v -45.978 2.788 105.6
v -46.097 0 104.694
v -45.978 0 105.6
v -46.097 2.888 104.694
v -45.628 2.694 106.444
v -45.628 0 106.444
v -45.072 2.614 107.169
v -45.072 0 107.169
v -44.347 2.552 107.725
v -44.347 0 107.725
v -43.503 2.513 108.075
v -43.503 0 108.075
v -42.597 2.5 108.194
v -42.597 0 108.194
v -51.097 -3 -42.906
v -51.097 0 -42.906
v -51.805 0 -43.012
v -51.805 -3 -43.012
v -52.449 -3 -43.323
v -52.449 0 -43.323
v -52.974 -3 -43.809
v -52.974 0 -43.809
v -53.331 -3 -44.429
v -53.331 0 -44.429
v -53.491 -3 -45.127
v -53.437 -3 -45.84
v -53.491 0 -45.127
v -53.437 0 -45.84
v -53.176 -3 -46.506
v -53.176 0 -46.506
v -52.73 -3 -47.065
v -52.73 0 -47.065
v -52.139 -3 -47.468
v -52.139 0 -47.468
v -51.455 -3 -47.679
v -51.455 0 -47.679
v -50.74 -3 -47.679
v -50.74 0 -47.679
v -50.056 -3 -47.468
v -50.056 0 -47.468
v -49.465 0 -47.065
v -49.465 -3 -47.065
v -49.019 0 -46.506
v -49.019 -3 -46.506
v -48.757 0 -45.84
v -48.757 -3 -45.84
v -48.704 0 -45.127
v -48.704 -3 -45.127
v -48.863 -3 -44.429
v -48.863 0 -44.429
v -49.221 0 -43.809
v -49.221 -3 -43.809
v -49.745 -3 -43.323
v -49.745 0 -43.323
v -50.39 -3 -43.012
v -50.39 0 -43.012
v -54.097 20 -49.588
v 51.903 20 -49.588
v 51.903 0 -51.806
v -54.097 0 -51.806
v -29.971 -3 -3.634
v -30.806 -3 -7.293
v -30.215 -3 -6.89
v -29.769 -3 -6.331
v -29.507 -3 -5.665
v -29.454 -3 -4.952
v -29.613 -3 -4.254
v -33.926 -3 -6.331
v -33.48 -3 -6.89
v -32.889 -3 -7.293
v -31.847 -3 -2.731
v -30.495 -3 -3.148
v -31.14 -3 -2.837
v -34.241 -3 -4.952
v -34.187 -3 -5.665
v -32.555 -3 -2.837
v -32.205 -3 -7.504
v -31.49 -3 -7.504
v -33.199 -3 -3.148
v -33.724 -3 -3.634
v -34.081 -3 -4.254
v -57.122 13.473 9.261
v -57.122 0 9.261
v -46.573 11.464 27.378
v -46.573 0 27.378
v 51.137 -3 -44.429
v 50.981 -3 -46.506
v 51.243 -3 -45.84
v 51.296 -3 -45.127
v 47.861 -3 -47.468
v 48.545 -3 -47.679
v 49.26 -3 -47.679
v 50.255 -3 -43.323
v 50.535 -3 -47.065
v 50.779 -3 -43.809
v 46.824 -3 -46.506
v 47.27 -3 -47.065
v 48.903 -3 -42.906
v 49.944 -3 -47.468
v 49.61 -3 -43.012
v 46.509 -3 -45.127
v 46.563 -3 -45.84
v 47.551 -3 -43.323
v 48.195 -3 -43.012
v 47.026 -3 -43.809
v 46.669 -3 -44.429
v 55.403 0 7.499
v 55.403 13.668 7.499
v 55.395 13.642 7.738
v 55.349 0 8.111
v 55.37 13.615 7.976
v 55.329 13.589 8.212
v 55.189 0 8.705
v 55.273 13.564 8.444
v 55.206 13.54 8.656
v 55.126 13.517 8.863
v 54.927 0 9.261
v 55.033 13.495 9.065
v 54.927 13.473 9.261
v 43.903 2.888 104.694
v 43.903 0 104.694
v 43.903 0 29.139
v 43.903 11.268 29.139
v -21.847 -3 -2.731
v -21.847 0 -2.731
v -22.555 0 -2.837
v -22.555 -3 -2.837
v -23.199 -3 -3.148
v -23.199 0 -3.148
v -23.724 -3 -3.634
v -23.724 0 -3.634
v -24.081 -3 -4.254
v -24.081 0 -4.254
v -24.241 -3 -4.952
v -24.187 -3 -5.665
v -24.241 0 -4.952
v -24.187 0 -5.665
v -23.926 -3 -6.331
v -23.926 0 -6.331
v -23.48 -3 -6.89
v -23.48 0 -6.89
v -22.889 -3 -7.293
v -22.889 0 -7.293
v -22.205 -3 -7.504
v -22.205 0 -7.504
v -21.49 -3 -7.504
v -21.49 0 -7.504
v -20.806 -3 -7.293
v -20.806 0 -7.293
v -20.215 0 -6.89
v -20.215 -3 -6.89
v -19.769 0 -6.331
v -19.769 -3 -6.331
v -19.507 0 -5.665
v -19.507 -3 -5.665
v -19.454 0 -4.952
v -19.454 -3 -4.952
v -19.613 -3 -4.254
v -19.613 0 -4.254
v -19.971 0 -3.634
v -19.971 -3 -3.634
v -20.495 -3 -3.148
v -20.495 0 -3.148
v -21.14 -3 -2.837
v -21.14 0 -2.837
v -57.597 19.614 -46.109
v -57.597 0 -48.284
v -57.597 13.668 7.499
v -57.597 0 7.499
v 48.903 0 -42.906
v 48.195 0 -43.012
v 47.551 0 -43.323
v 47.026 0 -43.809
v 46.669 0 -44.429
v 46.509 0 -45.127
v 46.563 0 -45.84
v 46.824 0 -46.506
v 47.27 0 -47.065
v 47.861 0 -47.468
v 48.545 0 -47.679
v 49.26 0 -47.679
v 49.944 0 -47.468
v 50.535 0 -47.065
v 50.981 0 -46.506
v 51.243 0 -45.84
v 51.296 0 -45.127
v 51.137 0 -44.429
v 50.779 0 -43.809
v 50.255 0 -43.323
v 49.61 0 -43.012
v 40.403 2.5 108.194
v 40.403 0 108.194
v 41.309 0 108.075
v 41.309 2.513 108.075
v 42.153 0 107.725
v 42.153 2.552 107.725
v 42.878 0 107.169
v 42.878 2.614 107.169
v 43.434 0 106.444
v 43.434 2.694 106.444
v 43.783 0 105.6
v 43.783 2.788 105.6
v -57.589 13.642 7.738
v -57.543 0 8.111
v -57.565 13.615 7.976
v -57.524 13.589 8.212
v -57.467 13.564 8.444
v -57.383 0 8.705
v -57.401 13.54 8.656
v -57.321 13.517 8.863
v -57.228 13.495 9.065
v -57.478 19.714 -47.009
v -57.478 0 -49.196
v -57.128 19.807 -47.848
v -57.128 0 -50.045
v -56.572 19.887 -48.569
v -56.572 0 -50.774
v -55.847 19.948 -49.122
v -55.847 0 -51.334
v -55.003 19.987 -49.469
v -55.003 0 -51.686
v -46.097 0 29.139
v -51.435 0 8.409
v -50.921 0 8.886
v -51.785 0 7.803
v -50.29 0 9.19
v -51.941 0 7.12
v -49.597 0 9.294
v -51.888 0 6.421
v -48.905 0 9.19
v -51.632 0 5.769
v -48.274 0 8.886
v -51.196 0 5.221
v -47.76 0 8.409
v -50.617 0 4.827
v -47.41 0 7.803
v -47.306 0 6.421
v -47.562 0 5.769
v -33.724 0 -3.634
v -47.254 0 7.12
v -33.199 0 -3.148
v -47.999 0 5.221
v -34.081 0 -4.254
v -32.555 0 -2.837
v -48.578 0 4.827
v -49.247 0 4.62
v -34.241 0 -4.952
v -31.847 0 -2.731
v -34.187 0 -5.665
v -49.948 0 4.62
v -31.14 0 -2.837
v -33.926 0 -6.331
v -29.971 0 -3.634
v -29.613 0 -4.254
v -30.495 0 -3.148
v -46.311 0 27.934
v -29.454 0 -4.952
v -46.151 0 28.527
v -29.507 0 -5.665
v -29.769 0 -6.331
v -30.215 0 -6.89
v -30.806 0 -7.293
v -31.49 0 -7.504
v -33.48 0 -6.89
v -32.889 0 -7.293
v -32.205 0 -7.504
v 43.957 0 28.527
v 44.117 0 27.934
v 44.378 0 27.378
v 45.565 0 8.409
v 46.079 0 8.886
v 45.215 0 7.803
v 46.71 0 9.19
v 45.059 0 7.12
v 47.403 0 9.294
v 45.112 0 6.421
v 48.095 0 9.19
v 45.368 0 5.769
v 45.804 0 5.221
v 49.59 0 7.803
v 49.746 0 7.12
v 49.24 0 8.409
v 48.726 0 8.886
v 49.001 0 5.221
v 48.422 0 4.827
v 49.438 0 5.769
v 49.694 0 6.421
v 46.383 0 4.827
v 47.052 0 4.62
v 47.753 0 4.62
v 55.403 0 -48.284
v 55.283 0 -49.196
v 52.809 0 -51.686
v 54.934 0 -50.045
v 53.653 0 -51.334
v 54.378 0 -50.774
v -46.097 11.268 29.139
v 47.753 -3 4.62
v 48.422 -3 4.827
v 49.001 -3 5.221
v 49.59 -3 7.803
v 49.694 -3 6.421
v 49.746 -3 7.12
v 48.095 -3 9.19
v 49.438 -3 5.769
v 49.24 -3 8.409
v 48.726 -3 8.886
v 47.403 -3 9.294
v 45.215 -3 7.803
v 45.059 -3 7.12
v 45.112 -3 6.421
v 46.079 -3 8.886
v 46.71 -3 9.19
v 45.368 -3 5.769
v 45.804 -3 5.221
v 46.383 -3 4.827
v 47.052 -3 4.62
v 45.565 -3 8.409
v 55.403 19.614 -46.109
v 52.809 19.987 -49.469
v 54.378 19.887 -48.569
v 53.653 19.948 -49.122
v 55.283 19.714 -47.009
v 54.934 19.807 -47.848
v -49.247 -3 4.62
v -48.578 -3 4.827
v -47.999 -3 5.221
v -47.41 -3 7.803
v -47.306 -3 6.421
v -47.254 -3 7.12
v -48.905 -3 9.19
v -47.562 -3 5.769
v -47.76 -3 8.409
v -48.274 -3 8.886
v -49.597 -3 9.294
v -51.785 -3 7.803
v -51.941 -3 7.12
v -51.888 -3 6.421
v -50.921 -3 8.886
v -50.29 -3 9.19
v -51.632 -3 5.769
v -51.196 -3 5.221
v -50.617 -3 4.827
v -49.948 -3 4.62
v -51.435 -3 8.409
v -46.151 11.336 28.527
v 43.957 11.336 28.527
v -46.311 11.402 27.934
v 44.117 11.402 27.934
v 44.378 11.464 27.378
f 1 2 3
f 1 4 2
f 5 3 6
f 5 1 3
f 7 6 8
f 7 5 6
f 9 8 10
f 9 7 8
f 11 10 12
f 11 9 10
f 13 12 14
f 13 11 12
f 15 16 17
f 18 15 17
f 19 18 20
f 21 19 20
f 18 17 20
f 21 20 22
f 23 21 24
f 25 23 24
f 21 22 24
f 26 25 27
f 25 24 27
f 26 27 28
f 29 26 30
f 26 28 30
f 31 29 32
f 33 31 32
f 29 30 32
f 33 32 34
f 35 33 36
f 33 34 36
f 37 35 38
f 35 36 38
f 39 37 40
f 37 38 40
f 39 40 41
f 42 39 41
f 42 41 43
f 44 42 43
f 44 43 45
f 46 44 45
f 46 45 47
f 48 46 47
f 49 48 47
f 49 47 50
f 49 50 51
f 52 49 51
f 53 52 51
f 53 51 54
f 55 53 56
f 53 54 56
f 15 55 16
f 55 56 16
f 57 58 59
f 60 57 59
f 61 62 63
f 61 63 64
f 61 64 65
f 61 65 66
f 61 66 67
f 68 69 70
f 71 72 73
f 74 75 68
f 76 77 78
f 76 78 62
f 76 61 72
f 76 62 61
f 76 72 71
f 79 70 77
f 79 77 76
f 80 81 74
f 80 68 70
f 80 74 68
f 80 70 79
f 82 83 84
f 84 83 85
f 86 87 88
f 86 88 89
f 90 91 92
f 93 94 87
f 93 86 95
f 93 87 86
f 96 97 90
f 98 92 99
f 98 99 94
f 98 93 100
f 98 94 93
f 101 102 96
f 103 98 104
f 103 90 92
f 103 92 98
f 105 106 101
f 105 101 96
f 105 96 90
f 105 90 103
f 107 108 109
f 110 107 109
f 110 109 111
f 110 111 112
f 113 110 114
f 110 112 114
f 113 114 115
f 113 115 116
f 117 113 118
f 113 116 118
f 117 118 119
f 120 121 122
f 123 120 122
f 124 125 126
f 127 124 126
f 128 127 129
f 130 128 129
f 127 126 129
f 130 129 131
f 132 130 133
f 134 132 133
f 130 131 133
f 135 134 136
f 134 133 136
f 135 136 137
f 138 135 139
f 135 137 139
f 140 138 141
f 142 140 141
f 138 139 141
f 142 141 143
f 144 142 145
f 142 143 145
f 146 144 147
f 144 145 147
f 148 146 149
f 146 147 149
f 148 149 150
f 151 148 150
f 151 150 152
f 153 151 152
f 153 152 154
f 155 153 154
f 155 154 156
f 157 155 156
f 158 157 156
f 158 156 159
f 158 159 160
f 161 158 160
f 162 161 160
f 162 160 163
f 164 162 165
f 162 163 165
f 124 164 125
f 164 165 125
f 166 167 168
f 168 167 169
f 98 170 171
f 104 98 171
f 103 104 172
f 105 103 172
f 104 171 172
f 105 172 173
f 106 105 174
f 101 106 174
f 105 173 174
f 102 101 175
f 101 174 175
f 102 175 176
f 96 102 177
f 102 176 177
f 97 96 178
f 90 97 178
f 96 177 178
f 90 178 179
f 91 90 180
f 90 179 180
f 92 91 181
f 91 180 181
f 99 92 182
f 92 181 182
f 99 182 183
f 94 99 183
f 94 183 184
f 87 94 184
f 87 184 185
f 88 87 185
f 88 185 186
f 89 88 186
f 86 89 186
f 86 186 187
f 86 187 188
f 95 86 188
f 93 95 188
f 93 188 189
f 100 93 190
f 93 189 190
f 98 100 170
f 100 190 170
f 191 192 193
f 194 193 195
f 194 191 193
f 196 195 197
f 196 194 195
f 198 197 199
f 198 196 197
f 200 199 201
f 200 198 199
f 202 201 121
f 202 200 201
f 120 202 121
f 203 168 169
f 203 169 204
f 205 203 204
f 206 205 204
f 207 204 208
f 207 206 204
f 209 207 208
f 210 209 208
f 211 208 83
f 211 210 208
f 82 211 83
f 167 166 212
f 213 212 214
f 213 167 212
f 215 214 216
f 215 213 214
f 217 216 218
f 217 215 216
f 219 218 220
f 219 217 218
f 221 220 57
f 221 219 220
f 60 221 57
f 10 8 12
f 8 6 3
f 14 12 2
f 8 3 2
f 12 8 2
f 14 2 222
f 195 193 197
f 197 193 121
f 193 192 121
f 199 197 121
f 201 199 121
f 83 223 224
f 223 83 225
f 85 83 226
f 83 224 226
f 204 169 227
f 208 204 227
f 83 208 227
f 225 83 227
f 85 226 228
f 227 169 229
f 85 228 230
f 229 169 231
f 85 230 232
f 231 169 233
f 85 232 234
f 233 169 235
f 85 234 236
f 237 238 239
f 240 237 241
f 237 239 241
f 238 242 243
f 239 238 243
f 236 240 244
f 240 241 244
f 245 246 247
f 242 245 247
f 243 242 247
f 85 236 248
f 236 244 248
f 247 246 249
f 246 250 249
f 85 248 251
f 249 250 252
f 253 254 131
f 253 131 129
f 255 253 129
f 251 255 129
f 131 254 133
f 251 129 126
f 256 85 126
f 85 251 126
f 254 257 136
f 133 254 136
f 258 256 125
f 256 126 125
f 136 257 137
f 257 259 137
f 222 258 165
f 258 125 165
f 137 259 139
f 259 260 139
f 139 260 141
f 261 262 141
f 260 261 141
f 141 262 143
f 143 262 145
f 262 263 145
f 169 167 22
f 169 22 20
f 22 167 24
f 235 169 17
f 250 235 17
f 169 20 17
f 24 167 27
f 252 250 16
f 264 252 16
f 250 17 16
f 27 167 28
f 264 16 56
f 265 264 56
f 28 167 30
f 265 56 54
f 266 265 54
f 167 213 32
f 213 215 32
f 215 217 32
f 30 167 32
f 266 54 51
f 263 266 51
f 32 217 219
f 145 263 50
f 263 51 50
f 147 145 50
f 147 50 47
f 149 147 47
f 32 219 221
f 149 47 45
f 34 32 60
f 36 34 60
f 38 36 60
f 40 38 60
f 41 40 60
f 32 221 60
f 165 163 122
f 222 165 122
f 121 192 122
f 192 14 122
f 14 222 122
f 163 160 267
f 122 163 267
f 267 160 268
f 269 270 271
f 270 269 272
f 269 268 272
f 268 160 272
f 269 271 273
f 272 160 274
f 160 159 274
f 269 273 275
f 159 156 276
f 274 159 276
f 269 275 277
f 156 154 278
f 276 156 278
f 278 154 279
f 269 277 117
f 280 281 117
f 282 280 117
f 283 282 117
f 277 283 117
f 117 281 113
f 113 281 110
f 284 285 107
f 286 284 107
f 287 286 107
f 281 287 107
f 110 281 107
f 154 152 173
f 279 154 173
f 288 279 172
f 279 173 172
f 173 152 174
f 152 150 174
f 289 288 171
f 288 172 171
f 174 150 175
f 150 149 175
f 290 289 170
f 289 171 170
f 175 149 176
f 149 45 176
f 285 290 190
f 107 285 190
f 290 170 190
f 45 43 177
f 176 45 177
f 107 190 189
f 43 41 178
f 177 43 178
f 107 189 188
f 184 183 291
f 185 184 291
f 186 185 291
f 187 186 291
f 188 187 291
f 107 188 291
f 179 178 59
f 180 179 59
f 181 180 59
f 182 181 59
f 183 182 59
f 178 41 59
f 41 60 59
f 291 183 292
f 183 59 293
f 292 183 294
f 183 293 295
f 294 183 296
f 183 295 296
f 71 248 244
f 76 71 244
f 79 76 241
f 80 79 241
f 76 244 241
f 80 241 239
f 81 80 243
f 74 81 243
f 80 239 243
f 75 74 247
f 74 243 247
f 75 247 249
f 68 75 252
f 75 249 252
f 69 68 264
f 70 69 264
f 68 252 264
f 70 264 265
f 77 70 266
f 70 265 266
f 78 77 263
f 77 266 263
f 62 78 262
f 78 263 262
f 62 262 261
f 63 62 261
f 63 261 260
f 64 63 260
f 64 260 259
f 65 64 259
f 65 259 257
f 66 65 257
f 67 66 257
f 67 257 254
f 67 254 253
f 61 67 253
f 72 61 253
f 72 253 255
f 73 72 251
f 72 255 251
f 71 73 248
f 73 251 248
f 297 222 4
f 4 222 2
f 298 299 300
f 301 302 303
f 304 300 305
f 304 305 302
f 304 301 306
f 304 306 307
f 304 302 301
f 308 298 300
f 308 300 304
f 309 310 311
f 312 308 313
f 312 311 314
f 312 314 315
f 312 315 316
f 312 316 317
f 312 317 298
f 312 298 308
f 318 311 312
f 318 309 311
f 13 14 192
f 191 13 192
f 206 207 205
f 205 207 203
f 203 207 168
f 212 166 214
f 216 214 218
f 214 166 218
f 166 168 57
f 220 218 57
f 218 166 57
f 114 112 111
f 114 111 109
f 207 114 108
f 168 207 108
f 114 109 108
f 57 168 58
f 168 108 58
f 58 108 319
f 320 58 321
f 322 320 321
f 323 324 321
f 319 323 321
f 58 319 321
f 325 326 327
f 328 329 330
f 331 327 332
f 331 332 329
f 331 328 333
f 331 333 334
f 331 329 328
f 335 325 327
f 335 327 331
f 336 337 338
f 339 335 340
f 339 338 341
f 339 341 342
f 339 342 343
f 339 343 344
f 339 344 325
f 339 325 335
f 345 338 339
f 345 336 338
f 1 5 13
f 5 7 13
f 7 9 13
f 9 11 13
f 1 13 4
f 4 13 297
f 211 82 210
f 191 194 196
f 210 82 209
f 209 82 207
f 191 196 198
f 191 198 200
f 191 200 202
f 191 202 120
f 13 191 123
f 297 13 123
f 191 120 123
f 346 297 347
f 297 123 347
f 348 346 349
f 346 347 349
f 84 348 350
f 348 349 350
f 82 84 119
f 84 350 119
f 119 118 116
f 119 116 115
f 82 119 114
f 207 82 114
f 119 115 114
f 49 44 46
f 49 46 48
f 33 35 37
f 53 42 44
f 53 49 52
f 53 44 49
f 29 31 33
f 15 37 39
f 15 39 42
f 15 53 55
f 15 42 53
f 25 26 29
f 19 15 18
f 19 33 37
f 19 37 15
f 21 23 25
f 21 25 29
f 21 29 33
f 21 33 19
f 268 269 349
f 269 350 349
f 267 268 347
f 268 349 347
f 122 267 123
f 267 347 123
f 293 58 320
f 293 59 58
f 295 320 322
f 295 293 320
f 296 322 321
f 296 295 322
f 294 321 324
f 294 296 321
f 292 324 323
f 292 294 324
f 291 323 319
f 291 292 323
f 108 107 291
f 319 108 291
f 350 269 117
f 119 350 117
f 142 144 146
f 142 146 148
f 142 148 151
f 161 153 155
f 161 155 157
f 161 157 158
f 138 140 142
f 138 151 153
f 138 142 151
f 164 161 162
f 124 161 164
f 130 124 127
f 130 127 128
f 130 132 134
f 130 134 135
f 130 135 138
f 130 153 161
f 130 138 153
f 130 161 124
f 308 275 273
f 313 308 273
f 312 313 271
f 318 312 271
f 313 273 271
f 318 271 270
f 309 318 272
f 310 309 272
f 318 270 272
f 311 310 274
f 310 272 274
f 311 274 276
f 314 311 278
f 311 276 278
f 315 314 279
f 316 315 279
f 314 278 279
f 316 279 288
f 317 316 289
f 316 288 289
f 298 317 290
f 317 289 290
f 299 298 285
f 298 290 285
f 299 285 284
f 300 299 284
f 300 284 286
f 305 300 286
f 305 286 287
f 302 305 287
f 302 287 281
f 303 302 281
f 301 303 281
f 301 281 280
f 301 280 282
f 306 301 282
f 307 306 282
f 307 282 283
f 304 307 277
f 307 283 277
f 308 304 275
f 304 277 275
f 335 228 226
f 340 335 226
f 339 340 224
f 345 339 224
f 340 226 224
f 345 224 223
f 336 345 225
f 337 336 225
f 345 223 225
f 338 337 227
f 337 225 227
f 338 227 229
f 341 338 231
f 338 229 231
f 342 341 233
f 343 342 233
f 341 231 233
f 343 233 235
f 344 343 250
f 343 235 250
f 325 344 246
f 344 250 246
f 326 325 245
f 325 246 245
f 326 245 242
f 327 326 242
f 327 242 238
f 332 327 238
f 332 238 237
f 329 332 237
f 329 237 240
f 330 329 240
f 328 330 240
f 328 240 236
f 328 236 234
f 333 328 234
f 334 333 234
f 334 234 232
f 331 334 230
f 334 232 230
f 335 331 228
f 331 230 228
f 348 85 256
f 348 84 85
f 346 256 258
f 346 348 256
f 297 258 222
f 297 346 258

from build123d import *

# Parameters (mm, degrees)
BOSS_EXTRUDE1_DEPTH = 20
SKETCH2_R           = 2.4
SKETCH2_R_2         = 2.35
BOSS_EXTRUDE2_DEPTH = 3
CUT_EXTRUDE1_DEPTH  = 158.718007744
FILLET1_R           = 3.5


with BuildPart() as part:
    # Sketch1 → Boss-Extrude1 (new body)
    with BuildSketch(Plane(origin=(0, 0, 0), x_dir=(1, 0, 0), z_dir=(0, 1, 0))):
        Polygon((-57.597316241, 51.805869074), (-57.597316241, -8.444130926), (-46.097316241, -28.194130926), (-46.097316241, -108.194130926), (43.902683759, -108.194130926), (43.902683759, -28.194130926), (55.402683759, -8.444130926), (55.402683759, 51.805869074), align=None)
    extrude(amount=BOSS_EXTRUDE1_DEPTH)

    # Sketch2 → Boss-Extrude2 (add)
    with BuildSketch(Plane.XZ):
        with Locations(Location((-51.097316241, -45.305869074, 0), (0, 0, 90))):
            Circle(SKETCH2_R)
        with Locations(Location((48.902683759, -45.305869074, 0), (0, 0, 90))):
            Circle(SKETCH2_R)
        with Locations(Location((-31.847316241, -5.130869074, 0), (0, 0, 90))):
            Circle(SKETCH2_R)
        with Locations(Location((-21.847316241, -5.130869074, 0), (0, 0, 90))):
            Circle(SKETCH2_R)
        with Locations(Location((47.402683759, 6.944130926, 0), (0, 0, 90))):
            Circle(SKETCH2_R_2)
        with Locations(Location((-49.597316241, 6.944130926, 0), (0, 0, 90))):
            Circle(SKETCH2_R_2)
    extrude(amount=BOSS_EXTRUDE2_DEPTH)

    # Sketch3 → Cut-Extrude1 (cut, through all)
    with BuildSketch(Plane(origin=(55.402683759, 0, 0), x_dir=(0, 0, -1), z_dir=(1, 0, 0))):
        Polygon((-108.194130926, 20), (-108.194130926, 2.5), (-8.444130926, 13.563542172), (-8.444130926, 20), align=None)
        Polygon((-8.444130926, 20), (-8.444130926, 13.563542172), (49.587615005, 20), align=None)
        Polygon((49.587615005, 20), (51.805869074, 0), (51.805869074, 20), align=None)
    extrude(amount=-CUT_EXTRUDE1_DEPTH, mode=Mode.SUBTRACT)

    # Fillet1
    fillet1_edges = [part.edges().sort_by_distance(p)[0] for p in [
        (-57.597316241, 10, -50.69674204),
        (55.402683759, 10, -50.69674204),
        (-46.097316241, 5.686508139, 28.194130926),
        (-57.597316241, 6.781771086, 8.444130926),
        (43.902683759, 5.686508139, 28.194130926),
        (43.902683759, 1.25, 108.194130926),
        (-46.097316241, 1.25, 108.194130926),
        (55.402683759, 6.781771086, 8.444130926),
    ]]
    fillet(fillet1_edges, radius=FILLET1_R)


solid = part.part
